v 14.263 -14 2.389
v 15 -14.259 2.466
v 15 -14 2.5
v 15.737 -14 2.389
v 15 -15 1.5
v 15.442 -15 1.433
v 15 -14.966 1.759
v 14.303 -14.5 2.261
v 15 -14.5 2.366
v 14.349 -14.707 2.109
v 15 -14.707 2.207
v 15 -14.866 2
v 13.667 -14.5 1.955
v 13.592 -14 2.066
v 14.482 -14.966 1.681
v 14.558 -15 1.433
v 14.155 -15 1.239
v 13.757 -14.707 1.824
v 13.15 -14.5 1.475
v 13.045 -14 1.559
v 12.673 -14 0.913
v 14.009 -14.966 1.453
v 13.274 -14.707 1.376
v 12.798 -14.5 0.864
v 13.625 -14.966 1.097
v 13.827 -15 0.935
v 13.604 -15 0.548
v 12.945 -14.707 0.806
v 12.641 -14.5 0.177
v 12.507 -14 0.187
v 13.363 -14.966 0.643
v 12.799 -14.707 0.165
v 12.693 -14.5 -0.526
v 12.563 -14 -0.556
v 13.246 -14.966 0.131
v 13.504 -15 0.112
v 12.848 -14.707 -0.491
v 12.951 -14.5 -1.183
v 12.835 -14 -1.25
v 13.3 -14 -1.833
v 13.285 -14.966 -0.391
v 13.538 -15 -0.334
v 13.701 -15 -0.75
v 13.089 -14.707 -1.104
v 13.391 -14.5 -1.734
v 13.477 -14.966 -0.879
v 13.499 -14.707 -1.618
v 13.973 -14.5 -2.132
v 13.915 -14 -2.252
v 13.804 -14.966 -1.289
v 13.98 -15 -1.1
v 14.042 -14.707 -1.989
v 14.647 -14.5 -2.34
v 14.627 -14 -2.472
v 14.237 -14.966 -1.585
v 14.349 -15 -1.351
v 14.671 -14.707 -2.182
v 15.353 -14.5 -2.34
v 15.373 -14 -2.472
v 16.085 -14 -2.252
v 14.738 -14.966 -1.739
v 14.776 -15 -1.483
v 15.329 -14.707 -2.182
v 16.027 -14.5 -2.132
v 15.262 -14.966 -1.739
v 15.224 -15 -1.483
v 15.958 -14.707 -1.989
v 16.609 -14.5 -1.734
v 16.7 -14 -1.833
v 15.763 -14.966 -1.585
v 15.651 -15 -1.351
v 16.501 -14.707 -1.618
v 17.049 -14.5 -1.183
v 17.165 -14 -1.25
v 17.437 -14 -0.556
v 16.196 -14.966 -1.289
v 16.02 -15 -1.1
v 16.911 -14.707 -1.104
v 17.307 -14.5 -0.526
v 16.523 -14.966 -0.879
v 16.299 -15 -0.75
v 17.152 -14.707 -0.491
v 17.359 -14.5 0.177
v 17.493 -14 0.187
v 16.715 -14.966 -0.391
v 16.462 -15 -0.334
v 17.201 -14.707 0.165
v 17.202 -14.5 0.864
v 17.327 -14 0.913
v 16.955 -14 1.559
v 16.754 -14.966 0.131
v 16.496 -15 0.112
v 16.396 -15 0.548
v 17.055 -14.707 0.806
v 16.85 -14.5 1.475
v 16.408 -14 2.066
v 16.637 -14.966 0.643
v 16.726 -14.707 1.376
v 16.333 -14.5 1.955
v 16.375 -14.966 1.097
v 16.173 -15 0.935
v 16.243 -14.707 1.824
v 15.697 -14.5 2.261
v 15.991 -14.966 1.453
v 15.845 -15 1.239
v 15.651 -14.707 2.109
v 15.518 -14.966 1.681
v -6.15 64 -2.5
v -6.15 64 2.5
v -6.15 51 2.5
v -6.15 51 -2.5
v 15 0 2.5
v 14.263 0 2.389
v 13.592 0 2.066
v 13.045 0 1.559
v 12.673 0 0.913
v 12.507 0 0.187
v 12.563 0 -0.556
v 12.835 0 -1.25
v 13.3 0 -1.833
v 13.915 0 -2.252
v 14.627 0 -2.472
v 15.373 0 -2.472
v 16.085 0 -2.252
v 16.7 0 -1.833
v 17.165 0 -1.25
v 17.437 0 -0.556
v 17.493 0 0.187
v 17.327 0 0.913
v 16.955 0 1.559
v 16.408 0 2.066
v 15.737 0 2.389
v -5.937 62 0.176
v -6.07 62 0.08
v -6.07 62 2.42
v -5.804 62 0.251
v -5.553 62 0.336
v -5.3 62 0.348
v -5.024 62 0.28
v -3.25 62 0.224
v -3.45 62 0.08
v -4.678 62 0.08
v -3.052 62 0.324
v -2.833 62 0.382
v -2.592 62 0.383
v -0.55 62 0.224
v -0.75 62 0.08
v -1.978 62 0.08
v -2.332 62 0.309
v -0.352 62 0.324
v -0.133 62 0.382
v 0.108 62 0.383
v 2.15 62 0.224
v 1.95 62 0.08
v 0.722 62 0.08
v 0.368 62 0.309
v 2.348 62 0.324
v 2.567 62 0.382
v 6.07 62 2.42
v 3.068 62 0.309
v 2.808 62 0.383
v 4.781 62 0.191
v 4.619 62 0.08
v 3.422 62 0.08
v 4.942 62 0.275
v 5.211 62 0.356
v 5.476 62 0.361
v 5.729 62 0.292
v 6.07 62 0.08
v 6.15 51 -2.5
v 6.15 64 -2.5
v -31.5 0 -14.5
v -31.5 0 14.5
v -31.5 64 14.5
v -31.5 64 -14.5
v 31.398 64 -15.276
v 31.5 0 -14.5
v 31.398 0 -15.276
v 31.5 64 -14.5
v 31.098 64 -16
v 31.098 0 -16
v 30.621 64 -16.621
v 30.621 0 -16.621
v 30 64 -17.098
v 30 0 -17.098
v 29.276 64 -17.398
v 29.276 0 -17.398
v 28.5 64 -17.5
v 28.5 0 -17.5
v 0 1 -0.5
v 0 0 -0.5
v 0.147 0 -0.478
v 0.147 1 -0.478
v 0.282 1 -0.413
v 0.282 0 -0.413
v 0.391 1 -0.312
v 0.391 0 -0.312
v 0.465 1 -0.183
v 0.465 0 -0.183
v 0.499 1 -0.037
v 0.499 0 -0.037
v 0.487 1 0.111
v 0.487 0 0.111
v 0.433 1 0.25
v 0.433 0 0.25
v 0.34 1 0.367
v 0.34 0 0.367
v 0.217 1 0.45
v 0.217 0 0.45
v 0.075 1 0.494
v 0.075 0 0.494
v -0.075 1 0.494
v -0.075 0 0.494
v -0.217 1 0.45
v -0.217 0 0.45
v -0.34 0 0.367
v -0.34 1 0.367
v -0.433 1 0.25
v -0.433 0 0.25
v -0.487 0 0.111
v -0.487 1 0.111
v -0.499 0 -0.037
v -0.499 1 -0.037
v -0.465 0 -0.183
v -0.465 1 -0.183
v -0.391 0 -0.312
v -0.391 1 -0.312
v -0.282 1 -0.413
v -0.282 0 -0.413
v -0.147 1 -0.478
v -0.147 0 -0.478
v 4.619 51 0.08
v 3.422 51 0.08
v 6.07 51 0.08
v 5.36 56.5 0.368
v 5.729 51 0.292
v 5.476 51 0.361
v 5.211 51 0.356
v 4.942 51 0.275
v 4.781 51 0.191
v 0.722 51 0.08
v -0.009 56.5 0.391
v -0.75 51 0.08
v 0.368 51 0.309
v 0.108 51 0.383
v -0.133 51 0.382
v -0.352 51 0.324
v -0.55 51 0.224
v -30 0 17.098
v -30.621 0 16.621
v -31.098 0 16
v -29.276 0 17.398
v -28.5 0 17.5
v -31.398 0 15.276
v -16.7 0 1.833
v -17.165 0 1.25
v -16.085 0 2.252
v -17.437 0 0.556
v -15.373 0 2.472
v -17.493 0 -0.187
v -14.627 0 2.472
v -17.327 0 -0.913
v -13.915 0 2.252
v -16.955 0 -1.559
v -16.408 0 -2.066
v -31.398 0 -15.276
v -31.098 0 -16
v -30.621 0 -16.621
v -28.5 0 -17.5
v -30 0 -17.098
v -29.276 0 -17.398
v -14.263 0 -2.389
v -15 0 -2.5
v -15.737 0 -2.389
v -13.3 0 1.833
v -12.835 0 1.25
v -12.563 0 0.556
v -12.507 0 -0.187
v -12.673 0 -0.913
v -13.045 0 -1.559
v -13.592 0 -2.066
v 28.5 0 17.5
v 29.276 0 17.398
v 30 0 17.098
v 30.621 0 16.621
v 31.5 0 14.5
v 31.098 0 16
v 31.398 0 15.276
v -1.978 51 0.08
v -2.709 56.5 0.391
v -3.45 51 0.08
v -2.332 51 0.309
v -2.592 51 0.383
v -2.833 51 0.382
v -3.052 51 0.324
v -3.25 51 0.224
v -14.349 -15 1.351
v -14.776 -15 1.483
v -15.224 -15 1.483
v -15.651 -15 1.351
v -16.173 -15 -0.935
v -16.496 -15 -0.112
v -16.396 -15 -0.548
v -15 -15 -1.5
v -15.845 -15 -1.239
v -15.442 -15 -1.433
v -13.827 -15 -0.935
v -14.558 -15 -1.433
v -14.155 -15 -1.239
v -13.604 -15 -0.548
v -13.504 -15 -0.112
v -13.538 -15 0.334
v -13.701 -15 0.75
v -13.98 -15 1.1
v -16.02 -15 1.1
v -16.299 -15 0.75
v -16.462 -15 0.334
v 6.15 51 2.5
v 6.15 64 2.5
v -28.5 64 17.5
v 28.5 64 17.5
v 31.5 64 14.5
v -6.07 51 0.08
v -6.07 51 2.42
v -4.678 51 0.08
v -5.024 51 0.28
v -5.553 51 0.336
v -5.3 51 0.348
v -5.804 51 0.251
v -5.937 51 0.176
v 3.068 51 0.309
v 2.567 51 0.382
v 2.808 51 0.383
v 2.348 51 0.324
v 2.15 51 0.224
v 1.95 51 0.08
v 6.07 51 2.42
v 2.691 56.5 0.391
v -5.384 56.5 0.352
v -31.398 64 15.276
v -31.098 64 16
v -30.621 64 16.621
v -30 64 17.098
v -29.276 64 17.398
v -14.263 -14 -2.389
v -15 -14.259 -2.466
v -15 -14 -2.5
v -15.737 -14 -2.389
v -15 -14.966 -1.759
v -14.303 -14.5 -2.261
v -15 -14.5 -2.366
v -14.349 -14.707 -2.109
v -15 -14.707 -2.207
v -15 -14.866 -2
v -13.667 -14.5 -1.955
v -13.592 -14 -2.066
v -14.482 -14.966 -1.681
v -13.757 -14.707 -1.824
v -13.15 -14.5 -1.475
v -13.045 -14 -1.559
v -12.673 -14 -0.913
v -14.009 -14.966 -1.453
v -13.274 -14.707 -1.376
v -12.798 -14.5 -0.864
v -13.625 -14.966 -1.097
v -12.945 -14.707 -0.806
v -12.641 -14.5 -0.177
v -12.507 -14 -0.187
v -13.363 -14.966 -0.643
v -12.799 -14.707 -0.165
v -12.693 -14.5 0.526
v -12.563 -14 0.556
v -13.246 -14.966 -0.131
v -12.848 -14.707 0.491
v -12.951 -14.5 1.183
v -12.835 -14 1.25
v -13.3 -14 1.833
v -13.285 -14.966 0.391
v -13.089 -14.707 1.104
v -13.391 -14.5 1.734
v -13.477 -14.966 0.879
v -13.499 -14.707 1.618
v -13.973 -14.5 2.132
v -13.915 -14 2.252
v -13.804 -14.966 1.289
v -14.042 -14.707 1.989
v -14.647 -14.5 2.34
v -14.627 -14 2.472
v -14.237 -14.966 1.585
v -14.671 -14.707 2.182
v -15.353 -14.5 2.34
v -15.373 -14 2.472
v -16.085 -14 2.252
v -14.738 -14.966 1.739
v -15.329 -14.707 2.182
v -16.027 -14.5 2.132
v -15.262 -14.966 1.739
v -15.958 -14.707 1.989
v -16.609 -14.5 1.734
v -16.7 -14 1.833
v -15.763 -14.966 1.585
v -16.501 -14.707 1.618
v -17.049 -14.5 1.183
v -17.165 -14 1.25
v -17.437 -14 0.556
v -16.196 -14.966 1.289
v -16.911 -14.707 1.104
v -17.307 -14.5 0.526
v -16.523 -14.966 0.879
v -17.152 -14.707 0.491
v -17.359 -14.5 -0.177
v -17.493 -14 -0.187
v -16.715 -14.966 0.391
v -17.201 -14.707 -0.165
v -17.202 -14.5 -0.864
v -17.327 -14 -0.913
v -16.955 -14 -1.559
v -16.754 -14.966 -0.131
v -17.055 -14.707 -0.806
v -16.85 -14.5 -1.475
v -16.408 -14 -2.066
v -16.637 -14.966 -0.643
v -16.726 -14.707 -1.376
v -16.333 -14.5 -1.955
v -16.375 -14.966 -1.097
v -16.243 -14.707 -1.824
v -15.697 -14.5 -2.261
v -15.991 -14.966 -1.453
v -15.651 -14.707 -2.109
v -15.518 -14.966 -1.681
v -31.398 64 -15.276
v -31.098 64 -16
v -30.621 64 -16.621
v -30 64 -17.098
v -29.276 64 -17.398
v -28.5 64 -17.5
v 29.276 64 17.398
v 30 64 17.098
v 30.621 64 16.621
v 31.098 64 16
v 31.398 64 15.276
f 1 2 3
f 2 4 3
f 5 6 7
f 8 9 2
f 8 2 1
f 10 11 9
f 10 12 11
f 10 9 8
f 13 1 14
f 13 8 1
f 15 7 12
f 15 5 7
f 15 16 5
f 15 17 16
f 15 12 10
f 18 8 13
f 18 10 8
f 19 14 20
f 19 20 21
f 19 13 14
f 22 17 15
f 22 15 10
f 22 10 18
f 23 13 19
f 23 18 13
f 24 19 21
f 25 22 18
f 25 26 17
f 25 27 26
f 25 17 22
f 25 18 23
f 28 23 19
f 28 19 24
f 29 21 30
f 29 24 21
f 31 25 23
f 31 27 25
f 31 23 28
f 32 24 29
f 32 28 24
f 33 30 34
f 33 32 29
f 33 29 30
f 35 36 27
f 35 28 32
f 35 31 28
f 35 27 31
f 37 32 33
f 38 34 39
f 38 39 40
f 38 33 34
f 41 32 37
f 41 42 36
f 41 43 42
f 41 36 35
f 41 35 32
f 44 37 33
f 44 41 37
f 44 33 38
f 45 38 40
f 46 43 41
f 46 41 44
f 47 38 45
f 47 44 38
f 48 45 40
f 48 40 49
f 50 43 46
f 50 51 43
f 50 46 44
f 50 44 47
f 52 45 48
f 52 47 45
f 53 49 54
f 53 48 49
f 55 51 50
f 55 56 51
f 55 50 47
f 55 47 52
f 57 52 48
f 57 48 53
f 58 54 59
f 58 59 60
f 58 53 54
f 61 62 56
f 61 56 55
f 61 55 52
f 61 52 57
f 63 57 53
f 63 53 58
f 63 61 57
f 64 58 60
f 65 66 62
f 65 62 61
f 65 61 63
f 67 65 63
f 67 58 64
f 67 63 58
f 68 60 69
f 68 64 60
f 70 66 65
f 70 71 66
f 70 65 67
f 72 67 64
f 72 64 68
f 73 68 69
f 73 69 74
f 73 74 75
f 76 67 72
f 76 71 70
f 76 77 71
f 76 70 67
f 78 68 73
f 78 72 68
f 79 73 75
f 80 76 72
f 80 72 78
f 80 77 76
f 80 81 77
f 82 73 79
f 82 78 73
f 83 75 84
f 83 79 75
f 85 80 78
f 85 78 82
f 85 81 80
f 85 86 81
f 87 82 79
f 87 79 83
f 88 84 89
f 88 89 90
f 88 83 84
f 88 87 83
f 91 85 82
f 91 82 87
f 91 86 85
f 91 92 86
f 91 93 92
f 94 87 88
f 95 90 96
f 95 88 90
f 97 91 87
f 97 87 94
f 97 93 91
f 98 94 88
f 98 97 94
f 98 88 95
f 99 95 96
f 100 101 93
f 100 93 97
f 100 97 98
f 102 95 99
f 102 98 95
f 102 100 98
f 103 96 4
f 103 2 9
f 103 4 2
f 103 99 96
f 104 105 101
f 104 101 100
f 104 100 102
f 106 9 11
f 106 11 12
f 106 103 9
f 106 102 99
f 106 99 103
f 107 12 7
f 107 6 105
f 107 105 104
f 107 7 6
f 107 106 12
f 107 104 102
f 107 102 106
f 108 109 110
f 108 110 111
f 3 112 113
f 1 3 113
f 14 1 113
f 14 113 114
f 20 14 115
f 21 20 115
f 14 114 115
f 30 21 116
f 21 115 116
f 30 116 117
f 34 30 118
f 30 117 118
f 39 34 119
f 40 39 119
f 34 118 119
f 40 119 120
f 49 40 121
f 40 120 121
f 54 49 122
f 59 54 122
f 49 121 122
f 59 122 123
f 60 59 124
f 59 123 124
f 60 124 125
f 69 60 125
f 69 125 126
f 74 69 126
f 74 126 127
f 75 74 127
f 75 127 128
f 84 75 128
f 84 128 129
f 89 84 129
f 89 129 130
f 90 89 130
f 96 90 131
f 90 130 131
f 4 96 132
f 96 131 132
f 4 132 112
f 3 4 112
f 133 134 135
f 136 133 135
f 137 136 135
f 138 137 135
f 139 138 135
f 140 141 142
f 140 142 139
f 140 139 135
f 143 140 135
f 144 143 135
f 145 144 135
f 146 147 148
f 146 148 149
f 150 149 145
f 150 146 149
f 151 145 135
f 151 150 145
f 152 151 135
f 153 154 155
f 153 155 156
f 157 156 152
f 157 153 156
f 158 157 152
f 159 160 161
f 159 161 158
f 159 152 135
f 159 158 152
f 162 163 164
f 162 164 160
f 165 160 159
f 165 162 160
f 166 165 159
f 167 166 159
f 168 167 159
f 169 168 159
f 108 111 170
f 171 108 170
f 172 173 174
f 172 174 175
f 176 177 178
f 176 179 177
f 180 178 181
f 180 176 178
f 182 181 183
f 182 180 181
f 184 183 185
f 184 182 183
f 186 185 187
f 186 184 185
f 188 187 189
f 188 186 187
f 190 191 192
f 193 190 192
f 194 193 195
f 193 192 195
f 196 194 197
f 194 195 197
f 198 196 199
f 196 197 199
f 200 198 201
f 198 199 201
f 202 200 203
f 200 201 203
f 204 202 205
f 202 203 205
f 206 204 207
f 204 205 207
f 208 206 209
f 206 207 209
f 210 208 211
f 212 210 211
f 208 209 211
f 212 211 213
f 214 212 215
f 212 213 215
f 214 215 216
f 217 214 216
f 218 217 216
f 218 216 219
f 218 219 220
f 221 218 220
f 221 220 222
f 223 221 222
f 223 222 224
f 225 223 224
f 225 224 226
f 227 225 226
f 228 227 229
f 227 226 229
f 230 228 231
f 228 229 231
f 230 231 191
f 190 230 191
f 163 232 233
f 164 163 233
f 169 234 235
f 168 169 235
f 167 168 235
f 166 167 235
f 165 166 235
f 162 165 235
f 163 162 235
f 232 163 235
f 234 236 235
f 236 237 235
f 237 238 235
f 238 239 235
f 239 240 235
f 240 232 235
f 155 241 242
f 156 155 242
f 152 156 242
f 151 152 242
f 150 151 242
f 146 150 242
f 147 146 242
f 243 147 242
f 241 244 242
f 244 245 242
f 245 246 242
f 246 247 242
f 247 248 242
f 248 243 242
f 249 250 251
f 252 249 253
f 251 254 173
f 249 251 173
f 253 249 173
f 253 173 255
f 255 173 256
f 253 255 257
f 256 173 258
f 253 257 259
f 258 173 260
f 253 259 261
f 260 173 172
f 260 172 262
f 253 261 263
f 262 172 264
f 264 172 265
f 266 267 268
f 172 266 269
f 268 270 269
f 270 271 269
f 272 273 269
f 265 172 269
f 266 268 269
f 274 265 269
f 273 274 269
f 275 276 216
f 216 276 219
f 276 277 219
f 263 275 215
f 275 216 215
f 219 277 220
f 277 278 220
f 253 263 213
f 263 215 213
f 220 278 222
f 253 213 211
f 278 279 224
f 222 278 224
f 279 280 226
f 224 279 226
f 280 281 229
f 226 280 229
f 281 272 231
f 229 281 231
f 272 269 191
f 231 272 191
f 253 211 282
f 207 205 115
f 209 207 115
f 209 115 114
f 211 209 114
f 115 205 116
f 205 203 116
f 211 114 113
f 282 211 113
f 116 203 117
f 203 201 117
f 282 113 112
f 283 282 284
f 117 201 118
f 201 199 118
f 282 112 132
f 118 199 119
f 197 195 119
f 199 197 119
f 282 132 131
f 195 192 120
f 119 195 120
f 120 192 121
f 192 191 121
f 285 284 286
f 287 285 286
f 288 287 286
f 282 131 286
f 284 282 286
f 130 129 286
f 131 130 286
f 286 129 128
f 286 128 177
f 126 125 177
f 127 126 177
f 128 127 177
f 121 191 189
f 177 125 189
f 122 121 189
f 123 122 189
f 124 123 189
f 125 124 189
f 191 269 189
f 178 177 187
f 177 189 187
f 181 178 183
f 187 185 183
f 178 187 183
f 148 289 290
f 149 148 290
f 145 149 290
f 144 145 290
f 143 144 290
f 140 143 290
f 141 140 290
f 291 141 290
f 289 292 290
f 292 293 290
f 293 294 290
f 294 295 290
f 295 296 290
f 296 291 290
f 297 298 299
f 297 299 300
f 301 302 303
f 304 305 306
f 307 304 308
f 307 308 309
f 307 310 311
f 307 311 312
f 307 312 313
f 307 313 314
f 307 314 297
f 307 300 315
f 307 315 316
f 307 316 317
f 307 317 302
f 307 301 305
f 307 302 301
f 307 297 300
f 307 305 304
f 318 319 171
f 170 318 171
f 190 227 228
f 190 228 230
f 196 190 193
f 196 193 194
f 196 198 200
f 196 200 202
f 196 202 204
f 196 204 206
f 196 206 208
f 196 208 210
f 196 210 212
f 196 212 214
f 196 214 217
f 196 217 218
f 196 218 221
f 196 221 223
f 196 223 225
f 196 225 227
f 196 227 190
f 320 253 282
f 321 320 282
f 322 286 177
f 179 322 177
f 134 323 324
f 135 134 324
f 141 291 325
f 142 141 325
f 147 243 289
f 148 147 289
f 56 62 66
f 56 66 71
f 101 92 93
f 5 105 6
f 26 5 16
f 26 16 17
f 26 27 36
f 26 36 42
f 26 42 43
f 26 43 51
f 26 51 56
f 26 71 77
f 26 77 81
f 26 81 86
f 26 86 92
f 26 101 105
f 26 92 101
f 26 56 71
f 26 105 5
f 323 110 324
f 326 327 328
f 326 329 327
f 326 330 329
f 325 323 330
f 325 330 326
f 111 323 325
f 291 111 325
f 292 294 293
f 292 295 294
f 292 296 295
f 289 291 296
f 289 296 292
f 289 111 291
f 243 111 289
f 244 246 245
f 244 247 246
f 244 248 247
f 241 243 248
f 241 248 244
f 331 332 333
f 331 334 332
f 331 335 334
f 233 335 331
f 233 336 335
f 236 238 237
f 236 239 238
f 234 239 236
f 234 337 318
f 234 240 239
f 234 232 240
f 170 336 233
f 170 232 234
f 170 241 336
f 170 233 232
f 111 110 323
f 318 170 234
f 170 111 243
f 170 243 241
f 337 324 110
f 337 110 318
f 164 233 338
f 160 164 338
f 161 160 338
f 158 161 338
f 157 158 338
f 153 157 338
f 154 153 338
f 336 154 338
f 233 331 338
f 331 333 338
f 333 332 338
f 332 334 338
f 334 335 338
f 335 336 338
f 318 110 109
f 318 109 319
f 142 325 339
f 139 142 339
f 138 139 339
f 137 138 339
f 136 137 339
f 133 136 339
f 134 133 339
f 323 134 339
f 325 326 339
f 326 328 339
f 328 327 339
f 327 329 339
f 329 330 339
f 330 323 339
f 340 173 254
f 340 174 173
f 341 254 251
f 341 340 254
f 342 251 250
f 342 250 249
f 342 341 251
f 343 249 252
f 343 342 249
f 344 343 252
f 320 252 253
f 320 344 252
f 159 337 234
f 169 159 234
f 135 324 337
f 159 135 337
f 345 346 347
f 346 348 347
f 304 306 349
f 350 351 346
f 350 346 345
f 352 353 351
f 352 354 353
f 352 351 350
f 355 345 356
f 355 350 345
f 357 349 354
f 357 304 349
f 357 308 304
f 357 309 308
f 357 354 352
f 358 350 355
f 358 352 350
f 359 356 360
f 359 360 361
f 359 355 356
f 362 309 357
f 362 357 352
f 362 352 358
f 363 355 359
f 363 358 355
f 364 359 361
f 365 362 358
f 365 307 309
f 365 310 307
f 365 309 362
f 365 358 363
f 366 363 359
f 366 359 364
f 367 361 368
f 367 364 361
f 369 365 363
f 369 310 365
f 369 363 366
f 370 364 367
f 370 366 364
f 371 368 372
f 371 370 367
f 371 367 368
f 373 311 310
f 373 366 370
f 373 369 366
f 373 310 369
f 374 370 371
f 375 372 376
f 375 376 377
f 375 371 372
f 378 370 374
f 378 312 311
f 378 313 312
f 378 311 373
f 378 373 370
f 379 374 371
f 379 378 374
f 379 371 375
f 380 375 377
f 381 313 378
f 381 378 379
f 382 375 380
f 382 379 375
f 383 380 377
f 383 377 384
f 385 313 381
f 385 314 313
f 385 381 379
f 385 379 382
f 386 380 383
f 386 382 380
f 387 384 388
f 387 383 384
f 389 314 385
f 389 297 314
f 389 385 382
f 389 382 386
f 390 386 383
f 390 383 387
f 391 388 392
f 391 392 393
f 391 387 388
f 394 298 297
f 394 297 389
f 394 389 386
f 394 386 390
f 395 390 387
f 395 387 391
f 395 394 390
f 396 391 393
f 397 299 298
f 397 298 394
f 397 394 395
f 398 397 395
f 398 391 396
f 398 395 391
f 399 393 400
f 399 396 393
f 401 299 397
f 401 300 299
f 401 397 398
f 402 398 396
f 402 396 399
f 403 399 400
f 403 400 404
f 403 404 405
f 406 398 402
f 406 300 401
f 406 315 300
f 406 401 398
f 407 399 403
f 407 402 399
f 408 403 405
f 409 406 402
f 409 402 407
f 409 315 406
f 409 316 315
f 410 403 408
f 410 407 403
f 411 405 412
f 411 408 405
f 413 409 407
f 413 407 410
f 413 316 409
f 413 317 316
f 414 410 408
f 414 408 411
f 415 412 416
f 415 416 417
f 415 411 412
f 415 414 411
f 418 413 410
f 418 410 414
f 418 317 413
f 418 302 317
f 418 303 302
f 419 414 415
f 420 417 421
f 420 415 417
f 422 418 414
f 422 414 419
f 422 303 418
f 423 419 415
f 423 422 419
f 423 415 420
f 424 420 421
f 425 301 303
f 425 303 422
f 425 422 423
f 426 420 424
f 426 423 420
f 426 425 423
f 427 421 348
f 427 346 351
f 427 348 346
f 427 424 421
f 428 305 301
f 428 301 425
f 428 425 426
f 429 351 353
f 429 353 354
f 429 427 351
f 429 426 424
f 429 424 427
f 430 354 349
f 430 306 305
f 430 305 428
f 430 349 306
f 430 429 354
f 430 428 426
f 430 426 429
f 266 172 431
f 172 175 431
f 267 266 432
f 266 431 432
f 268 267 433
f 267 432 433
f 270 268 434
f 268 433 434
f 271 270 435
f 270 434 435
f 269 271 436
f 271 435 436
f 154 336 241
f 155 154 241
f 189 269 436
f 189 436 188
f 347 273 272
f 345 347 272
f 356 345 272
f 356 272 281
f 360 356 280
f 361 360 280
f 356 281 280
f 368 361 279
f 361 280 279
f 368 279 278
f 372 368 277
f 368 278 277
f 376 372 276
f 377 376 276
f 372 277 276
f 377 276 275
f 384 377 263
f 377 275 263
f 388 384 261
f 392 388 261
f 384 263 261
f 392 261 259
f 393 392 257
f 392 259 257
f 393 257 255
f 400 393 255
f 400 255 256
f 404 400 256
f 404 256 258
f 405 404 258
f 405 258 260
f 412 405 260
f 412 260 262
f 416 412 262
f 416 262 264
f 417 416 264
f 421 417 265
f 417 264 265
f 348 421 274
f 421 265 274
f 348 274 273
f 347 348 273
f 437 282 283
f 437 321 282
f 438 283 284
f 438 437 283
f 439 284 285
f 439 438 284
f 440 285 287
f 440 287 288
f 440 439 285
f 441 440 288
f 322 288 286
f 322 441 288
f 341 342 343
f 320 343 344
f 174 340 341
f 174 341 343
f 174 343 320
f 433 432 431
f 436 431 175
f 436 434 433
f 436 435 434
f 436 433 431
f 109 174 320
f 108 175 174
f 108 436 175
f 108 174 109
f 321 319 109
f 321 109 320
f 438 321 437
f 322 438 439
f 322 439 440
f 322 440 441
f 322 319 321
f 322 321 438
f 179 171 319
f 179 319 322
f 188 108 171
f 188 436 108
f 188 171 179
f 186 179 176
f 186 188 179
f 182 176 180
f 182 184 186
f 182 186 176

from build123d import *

# Parameters (mm, degrees)
SKETCH1_W           = 63
SKETCH1_H           = 35
BOSS_EXTRUDE1_DEPTH = 64
FILLET1_R           = 3
SKETCH2_R           = 2.5
BOSS_EXTRUDE2_DEPTH = 15
FILLET2_R           = 1
SKETCH4_R           = 0.5
CUT_EXTRUDE1_DEPTH  = 1
SKETCH5_W           = 12.3
SKETCH5_H           = 5
CUT_EXTRUDE2_DEPTH  = 13
BOSS_EXTRUDE3_DEPTH = 11


with BuildPart() as part:
    # Sketch1 → Boss-Extrude1 (new body)
    with BuildSketch(Plane(origin=(0, 0, 0), x_dir=(1, 0, 0), z_dir=(0, 1, 0))):
        Rectangle(SKETCH1_W, SKETCH1_H)
    extrude(amount=BOSS_EXTRUDE1_DEPTH)

    # Fillet1
    fillet1_edges = [part.edges().sort_by_distance(p)[0] for p in [
        (31.5, 32, 17.5),
        (-31.5, 32, 17.5),
        (-31.5, 32, -17.5),
        (31.5, 32, -17.5),
    ]]
    fillet(fillet1_edges, radius=FILLET1_R)

    # Sketch2 → Boss-Extrude2 (add)
    with BuildSketch(Plane.XZ):
        with Locations(Location((-15, 0, 0), (0, 0, 270))):
            Circle(SKETCH2_R)
        with Locations(Location((15, 0, 0), (0, 0, 90))):
            Circle(SKETCH2_R)
    extrude(amount=BOSS_EXTRUDE2_DEPTH)

    # Fillet2
    fillet2_edges = [part.edges().sort_by_distance(p)[0] for p in [
        (-15, -15, 2.5),
        (15, -15, -2.5),
    ]]
    fillet(fillet2_edges, radius=FILLET2_R)

    # Sketch4 → Cut-Extrude1 (cut)
    with BuildSketch(Plane.XZ):
        with Locations(Location((0, 0, 0), (0, 0, 270))):
            Circle(SKETCH4_R)
    extrude(amount=-CUT_EXTRUDE1_DEPTH, mode=Mode.SUBTRACT)

    # Sketch5 → Cut-Extrude2 (cut)
    with BuildSketch(Plane(origin=(0, 64, 0), x_dir=(1, 0, 0), z_dir=(0, 1, 0))):
        Rectangle(SKETCH5_W, SKETCH5_H)
    extrude(amount=-CUT_EXTRUDE2_DEPTH, mode=Mode.SUBTRACT)

    # Sketch6 → Boss-Extrude3 (add)
    with BuildSketch(Plane(origin=(0, 51, 0), x_dir=(1, 0, 0), z_dir=(0, 1, 0))):
        with BuildLine():
            Line((-6.07, -0.08), (-6.07, -2.42))
            Line((-6.07, -2.42), (6.07, -2.42))
            Line((6.07, -2.42), (6.07, -0.08))
            add(Edge.make_bspline(
                [(6.07, -0.08), (5.375982436, -0.656866539), (4.618995195, -0.08)],
                knots=[0.014708799, 0.014708799, 0.014708799, 0.930781283, 0.930781283, 0.930781283], degree=2))
            Line((4.618995195, -0.08), (3.421648134, -0.08))
            add(Edge.make_bspline(
                [(3.421648134, -0.08), (2.695459097, -0.701406982), (1.95, -0.08)],
                knots=[0.014708799, 0.014708799, 0.014708799, 0.984687043, 0.984687043, 0.984687043], degree=2))
            Line((1.95, -0.08), (0.721648134, -0.08))
            add(Edge.make_bspline(
                [(0.721648134, -0.08), (-0.004540903, -0.701406982), (-0.75, -0.08)],
                knots=[0.014708799, 0.014708799, 0.014708799, 0.984687043, 0.984687043, 0.984687043], degree=2))
            Line((-0.75, -0.08), (-1.978351866, -0.08))
            add(Edge.make_bspline(
                [(-1.978351866, -0.08), (-2.704540903, -0.701406982), (-3.45, -0.08)],
                knots=[0.014708799, 0.014708799, 0.014708799, 0.984687043, 0.984687043, 0.984687043], degree=2))
            Line((-3.45, -0.08), (-4.678351866, -0.08))
            add(Edge.make_bspline(
                [(-4.678351866, -0.08), (-5.393535509, -0.624780928), (-6.07, -0.08)],
                knots=[0.084890823, 0.084890823, 0.084890823, 0.984687043, 0.984687043, 0.984687043], degree=2))
        make_face()
    extrude(amount=BOSS_EXTRUDE3_DEPTH)


solid = part.part
